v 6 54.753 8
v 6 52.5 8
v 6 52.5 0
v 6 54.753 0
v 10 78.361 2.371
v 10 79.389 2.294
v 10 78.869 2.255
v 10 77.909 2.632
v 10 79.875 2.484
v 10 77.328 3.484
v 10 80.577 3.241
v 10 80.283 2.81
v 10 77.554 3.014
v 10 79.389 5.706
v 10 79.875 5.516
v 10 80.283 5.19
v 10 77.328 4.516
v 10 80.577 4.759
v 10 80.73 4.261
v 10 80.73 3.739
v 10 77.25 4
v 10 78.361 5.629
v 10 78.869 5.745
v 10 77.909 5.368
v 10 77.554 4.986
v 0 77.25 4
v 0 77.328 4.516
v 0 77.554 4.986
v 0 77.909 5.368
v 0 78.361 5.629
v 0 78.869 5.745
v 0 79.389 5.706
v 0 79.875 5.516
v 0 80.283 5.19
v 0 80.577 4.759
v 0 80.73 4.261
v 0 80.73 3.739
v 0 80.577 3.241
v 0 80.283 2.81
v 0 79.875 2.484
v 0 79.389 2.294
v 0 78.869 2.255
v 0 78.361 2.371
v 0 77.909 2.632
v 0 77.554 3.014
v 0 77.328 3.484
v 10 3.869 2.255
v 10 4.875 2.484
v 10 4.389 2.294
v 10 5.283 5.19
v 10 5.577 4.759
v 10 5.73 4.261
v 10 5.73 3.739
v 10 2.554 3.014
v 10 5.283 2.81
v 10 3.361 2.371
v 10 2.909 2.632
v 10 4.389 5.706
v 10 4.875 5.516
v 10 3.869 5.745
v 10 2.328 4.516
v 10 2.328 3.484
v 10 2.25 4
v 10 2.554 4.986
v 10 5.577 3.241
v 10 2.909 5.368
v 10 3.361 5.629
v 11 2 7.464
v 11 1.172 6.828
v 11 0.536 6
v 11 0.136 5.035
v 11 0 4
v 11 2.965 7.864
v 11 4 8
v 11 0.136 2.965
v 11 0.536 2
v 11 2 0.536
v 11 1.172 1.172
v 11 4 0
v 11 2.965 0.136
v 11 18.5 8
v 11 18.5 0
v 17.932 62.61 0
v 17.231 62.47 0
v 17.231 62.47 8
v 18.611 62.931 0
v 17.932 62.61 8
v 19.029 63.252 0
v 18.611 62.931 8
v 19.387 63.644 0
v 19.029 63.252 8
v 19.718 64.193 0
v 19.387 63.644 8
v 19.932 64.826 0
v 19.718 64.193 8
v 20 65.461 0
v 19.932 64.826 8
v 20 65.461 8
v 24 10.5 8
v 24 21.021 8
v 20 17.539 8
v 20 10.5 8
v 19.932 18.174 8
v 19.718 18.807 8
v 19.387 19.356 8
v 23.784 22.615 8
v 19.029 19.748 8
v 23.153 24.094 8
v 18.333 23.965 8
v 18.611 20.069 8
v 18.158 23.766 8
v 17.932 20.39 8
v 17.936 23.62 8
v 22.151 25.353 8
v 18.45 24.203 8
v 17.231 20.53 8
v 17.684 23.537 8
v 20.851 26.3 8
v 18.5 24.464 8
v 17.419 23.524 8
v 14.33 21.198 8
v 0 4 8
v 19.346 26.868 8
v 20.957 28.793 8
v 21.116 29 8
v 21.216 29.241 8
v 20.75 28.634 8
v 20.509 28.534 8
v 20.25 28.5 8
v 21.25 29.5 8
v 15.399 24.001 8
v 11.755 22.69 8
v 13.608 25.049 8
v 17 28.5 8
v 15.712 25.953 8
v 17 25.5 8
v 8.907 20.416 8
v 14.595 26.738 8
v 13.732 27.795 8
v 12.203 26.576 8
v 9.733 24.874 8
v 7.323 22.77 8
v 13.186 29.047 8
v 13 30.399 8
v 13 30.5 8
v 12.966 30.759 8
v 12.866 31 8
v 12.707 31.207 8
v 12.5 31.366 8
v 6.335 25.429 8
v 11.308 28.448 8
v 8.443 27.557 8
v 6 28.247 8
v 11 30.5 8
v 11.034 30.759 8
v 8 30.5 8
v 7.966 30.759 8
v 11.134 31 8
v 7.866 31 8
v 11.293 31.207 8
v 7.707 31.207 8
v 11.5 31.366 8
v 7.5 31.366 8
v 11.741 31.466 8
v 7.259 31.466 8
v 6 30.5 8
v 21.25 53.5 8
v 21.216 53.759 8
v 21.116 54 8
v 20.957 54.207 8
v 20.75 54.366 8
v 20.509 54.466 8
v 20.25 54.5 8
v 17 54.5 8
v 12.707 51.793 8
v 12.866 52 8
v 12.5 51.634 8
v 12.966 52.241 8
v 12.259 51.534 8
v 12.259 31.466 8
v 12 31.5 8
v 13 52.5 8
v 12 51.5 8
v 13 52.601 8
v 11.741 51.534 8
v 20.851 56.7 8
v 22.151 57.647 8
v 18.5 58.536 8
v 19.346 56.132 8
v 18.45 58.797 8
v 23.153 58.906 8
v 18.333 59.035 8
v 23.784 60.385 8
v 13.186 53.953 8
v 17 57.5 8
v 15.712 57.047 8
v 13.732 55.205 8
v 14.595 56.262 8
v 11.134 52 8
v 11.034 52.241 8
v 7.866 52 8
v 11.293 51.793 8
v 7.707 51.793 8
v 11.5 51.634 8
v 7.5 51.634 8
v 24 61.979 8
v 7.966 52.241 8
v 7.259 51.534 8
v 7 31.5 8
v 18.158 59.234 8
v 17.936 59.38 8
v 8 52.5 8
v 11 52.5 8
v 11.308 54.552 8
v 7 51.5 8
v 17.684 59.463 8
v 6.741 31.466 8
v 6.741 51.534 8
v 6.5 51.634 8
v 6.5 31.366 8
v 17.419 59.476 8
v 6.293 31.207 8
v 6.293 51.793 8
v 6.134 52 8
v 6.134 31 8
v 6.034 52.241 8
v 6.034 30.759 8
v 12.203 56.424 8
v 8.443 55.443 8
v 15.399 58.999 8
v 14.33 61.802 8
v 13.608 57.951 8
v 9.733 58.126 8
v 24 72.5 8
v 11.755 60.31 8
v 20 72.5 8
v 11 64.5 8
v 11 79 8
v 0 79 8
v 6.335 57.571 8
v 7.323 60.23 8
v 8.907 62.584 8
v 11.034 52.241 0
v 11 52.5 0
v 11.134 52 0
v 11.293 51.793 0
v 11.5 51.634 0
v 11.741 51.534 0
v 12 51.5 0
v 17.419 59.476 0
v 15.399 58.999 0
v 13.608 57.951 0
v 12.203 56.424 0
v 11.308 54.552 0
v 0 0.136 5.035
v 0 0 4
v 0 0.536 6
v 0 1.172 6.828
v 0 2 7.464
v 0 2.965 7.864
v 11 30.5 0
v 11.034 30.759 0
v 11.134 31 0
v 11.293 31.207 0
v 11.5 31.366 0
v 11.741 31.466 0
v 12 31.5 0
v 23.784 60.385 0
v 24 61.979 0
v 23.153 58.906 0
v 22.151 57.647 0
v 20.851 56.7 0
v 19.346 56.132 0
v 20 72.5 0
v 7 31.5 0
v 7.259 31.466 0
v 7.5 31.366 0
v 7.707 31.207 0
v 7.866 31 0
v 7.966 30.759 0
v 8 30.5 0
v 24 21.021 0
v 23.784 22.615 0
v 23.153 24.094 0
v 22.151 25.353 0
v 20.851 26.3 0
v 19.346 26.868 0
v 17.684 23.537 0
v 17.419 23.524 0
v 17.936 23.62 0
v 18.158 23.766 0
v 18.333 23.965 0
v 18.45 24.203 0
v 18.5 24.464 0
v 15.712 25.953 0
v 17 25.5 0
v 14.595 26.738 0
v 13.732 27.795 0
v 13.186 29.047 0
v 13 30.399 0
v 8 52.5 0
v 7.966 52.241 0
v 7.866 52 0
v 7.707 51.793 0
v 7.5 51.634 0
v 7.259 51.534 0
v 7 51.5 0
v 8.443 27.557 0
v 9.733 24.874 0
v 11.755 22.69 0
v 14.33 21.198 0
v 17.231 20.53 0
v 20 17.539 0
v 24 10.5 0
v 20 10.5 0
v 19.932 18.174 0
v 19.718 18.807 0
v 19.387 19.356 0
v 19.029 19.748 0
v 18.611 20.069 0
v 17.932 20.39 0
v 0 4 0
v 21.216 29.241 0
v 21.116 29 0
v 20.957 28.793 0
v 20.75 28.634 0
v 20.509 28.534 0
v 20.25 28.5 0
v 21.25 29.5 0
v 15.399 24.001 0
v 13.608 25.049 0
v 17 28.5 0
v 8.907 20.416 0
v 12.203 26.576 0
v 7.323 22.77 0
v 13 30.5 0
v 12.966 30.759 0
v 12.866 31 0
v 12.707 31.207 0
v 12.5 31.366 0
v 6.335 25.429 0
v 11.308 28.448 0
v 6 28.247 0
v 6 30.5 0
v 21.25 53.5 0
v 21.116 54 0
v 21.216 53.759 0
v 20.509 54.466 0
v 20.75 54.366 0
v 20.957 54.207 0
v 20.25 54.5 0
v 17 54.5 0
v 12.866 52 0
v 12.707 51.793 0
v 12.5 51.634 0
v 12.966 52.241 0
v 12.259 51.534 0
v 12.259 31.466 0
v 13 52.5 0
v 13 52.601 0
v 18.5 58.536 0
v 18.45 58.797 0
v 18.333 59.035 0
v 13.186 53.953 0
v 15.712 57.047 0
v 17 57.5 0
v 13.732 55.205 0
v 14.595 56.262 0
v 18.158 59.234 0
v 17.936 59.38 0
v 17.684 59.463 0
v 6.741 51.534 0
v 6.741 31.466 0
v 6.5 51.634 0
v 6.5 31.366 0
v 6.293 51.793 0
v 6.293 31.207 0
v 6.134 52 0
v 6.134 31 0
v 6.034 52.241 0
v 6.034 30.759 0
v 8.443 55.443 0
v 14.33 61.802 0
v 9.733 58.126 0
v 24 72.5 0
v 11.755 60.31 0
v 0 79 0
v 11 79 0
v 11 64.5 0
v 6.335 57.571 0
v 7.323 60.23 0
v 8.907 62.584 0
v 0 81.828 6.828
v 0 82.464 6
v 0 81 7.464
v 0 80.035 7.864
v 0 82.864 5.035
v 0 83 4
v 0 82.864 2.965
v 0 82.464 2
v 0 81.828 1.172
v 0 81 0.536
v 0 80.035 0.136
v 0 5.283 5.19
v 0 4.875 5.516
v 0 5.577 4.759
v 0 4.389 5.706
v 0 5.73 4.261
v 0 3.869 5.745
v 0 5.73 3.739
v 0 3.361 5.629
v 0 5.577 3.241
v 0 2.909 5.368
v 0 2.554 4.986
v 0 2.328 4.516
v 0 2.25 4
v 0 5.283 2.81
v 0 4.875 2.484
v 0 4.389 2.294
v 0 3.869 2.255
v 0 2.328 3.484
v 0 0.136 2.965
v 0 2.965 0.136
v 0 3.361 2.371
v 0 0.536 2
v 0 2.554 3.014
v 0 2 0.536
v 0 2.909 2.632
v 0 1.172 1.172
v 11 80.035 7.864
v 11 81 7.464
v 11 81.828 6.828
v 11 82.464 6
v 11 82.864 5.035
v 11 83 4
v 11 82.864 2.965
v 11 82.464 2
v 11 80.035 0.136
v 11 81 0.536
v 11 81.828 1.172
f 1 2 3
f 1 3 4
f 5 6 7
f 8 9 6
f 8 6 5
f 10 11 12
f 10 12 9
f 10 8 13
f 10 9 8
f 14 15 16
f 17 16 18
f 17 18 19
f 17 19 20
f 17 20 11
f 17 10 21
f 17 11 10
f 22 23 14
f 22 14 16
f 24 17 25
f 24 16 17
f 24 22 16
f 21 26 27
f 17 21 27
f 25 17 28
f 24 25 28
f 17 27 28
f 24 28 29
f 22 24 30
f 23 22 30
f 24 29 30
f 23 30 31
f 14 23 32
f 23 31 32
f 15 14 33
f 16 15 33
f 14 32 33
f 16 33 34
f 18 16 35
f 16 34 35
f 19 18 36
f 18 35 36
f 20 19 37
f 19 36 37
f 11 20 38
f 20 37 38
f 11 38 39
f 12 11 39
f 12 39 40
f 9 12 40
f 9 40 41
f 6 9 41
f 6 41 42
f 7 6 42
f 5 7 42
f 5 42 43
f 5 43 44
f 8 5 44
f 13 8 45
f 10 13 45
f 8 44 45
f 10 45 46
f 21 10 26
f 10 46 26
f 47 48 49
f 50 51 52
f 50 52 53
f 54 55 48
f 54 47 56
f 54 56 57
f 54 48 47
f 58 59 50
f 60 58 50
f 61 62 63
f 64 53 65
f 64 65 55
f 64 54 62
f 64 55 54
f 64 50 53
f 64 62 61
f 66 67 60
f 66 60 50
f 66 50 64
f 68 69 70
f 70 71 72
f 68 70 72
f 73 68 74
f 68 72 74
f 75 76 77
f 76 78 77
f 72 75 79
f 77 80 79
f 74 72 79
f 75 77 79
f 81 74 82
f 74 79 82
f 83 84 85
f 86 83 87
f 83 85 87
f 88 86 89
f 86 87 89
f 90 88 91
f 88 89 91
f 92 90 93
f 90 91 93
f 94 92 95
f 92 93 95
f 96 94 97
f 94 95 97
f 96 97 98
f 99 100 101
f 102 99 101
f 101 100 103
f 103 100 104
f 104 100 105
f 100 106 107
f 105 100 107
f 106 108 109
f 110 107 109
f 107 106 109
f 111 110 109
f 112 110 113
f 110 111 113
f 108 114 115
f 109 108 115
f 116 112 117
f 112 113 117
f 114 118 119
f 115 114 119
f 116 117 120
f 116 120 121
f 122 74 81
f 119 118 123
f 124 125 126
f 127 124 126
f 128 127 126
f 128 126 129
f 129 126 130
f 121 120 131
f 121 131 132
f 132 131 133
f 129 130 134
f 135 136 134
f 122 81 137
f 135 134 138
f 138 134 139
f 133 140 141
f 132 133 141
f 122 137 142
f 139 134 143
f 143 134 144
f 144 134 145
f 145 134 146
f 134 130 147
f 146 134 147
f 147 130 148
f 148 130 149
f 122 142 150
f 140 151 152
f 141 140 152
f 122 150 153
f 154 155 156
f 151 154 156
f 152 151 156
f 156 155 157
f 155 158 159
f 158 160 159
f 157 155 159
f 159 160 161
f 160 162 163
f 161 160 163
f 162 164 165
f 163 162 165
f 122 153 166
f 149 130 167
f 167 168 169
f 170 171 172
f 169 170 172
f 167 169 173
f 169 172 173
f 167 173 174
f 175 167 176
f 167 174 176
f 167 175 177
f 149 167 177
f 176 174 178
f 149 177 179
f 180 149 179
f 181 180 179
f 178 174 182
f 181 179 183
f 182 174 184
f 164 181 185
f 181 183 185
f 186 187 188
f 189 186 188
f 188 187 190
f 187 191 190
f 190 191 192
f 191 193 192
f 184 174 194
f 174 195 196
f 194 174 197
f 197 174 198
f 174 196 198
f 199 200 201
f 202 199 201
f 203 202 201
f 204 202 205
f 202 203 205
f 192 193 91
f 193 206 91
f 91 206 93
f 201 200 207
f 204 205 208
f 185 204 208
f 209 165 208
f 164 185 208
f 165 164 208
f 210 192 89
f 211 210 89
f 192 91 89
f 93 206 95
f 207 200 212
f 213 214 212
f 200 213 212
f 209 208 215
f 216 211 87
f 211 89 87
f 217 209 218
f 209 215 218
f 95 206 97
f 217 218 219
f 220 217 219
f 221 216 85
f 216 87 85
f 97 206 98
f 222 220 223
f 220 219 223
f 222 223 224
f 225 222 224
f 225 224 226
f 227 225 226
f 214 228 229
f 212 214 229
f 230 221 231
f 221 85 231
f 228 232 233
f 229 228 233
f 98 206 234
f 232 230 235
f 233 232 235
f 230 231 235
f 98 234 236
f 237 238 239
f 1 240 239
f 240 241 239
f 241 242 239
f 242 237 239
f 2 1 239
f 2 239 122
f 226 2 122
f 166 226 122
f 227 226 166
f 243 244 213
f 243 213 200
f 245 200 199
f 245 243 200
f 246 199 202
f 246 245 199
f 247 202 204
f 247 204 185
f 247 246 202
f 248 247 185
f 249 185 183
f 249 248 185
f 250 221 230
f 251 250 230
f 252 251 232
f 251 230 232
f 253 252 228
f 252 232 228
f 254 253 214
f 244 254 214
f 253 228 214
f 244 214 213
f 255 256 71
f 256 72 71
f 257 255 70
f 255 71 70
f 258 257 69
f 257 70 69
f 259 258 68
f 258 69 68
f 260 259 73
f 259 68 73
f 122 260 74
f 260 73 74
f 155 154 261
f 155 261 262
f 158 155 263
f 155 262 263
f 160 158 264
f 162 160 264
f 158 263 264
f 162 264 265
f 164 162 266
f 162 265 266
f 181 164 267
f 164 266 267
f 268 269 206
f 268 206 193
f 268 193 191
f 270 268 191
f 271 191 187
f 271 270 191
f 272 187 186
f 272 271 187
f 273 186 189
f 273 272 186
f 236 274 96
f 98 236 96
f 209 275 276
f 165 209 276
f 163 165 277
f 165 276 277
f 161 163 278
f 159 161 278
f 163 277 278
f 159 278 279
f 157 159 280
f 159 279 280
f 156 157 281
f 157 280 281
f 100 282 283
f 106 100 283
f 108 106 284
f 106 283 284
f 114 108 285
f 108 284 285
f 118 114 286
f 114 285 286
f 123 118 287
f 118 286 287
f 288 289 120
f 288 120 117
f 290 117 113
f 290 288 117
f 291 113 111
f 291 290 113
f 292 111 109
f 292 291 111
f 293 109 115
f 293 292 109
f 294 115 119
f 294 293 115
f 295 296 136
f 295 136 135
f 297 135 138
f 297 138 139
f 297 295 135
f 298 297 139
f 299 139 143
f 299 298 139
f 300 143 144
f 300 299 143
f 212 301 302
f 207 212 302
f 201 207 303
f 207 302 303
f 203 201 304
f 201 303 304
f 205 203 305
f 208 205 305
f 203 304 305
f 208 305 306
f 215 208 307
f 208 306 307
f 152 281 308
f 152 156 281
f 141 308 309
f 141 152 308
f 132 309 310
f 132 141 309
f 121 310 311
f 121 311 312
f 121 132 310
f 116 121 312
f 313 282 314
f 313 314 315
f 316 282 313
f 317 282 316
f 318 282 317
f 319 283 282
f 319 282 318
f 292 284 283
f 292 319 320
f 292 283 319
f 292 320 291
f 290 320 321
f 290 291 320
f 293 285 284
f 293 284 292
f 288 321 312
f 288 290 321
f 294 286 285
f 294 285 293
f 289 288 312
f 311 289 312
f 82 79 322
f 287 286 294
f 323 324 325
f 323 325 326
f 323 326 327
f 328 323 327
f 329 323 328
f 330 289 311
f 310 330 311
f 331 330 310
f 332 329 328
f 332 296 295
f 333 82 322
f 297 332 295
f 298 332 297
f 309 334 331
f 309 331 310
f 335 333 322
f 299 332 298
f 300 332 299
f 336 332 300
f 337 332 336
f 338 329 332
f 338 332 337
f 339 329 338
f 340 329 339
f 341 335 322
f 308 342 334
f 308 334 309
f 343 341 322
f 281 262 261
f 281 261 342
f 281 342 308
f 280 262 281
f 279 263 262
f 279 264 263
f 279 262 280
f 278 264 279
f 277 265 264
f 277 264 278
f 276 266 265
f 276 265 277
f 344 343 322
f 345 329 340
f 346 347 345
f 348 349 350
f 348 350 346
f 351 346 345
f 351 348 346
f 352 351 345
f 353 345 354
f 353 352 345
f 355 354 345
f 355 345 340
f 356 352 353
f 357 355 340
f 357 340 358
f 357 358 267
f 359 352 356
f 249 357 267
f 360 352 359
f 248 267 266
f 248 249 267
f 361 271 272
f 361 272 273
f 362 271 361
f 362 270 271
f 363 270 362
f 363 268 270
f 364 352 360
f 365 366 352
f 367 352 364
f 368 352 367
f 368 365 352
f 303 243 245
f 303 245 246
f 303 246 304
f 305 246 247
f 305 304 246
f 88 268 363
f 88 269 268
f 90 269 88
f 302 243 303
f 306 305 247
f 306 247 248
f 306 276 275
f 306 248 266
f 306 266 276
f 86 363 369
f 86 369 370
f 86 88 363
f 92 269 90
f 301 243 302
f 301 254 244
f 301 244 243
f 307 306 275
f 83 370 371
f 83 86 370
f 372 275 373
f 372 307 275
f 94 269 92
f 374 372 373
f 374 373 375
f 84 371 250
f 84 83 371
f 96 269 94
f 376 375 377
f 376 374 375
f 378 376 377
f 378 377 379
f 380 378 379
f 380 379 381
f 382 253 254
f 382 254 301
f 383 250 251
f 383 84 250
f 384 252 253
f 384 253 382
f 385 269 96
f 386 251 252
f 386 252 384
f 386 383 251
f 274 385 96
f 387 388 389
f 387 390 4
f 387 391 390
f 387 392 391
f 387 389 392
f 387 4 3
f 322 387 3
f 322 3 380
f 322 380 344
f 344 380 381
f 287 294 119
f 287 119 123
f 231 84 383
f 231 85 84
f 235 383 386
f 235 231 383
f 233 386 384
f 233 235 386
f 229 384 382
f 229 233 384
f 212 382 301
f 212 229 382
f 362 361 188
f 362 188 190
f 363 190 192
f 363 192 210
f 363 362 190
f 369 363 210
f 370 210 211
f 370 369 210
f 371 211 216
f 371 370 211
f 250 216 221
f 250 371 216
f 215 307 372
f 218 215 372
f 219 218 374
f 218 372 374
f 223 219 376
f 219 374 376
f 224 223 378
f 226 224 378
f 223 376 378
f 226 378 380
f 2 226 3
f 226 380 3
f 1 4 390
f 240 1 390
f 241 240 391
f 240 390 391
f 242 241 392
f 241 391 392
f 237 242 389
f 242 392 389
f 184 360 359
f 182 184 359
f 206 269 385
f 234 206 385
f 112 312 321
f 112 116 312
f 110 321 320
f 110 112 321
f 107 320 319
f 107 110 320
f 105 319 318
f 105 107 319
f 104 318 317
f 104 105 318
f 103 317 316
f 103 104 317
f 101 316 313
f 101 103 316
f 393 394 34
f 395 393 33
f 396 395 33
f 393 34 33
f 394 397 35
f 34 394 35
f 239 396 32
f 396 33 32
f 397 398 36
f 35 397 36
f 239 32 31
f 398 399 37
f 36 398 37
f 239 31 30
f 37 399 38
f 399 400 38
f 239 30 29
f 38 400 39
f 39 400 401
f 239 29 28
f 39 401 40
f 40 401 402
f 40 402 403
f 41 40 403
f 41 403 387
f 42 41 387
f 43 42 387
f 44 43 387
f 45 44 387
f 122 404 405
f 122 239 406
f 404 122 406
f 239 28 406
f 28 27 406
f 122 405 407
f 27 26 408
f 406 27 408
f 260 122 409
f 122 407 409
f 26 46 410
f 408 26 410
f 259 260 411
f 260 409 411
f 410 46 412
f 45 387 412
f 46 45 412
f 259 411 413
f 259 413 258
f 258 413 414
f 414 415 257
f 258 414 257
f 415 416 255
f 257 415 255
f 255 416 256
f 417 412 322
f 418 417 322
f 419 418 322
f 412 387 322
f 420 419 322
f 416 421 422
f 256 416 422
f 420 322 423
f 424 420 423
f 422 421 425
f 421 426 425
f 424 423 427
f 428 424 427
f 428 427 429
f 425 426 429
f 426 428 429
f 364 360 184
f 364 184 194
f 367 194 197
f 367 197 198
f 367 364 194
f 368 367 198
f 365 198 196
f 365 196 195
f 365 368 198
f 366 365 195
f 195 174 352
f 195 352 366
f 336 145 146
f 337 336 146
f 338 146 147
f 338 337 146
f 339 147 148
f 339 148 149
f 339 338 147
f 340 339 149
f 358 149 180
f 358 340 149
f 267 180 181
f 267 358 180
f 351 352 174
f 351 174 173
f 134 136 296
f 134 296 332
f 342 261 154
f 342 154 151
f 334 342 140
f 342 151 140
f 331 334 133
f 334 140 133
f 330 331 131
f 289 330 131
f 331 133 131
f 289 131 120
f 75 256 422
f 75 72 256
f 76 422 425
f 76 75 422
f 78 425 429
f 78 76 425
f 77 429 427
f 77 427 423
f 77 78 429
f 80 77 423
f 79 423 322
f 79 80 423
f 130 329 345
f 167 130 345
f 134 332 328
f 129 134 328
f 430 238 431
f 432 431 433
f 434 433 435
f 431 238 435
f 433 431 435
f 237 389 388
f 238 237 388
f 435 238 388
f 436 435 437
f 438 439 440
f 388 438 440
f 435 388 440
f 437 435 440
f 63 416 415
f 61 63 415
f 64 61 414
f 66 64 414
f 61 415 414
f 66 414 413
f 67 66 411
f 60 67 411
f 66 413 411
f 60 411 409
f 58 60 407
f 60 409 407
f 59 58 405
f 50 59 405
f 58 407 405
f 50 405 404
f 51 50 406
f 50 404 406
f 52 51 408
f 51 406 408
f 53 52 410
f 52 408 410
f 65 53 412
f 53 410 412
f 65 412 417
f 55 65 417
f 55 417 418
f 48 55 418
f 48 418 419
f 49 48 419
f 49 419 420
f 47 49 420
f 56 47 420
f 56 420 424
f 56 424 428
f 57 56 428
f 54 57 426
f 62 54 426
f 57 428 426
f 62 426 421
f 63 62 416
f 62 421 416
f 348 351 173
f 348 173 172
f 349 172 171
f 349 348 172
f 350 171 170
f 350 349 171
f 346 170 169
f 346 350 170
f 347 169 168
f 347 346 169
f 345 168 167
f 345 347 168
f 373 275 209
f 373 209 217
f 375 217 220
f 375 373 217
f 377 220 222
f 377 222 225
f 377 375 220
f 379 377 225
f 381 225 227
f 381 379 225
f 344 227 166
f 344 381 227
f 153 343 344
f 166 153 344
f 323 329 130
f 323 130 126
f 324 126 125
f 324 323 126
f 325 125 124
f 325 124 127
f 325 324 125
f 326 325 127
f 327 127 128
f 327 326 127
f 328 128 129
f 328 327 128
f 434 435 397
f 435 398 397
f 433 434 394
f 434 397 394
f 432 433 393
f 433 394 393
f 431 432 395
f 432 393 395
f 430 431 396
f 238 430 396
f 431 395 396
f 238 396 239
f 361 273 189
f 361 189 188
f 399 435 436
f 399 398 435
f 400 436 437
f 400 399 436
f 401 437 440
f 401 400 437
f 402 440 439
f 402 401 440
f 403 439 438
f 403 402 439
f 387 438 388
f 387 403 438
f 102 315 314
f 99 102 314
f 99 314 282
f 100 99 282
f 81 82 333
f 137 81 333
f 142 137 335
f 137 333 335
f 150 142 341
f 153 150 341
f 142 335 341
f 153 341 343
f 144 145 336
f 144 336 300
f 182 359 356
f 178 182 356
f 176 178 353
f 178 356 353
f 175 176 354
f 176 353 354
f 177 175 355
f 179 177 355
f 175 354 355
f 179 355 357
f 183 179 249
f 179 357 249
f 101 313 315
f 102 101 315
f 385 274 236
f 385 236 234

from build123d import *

# Parameters (mm, degrees)
F0_W          = 4
F0_H          = 8
F0_H_2        = 2
F0_W_2        = 5.5
F0_H_3        = 3.5
F0_W_3        = 4.25
F0_H_4        = 26
F1_DEPTH      = 8
F2_R          = 3.99999
F3_T1_DEPTH   = 37.8956518578
F4_T1_DEPTH   = 21.1532650868
F5_T1_DEPTH   = 21.1532650868
F6_R          = 1.75
F7_DEPTH      = 10
F8_T1_DEPTH   = 32.4948974279
F9_R          = 7
F10_R         = 10
F11_T1_DEPTH  = 8
F12_R         = 3
F13_T1_DEPTH  = 8
F13_T3_DEPTH  = 8
F13_T5_DEPTH  = 8
F13_T7_DEPTH  = 8
F13_T9_DEPTH  = 8
F13_T11_DEPTH = 8
F13_T13_DEPTH = 8
F13_T15_DEPTH = 8
F13_T17_DEPTH = 8
F13_T19_DEPTH = 8
F13_T21_DEPTH = 13
F13_T23_DEPTH = 13


# Not quite as in the source:
# - a fillet or chamfer that OpenCascade refuses, or shapes differently, is made with other operations: its cross-section is extruded or revolved along the edge and cut away or added
# - two fillets or chamfers of one size are made in one step
# - a fillet or chamfer is up to 0.001 mm smaller than in the source, because OpenCascade refuses the exact size


with BuildPart() as f1:
    # F0 (on Top) → F1 (new body)
    with BuildSketch(Plane.XY):
        Polygon((0, 83), (0, 0), (11, 0), (11, 10), (11, 18.5), (6, 18.5), (6, 31.5), (8, 31.5), (11, 31.5), (13, 31.5), (13, 25.5), (17, 25.5), (17, 28.5), (17, 54.5), (17, 57.5), (13, 57.5), (13, 51.5), (11, 51.5), (8, 51.5), (6, 51.5), (6, 64.5), (11, 64.5), (11, 73), (11, 83), align=None)
        with Locations((22, 68.5)):
            Rectangle(F0_W, F0_H)
        with Locations((22, 63.5)):
            Rectangle(F0_W, F0_H_2)
        with Locations((21.25, 57.75)):
            Rectangle(F0_W_2, F0_H_3)
        with Locations((21.25, 25.25)):
            Rectangle(F0_W_2, F0_H_3)
        with Locations((22, 19.5)):
            Rectangle(F0_W, F0_H_2)
        with Locations((22, 14.5)):
            Rectangle(F0_W, F0_H)
        Polygon((11, 23.5), (11, 20.5), (20, 20.5), (24, 20.5), (24, 23.5), (18.5, 23.5), (17, 23.5), align=None)
        Polygon((8, 20.5), (11, 20.5), (11, 23.5), (11, 25.5), (11, 31.5), (8, 31.5), align=None)
        Polygon((11, 59.5), (11, 62.5), (8, 62.5), (8, 51.5), (11, 51.5), (11, 57.5), align=None)
        Polygon((20, 62.5), (11, 62.5), (11, 59.5), (17, 59.5), (18.5, 59.5), (24, 59.5), (24, 62.5), align=None)
        with Locations((19.125, 41.5)):
            Rectangle(F0_W_3, F0_H_4)
    extrude(amount=F1_DEPTH)

    # F2 (radius 4 in the source; OpenCascade refuses exactly that, so slightly less here)
    f2_edges = [f1.edges().sort_by_distance(p)[0] for p in [
        (5.5, 83, 8),
        (5.5, 0, 8),
        (5.5, 0, 0),
        (5.5, 83, 0),
    ]]
    fillet(f2_edges, radius=F2_R)

    # F3: fillet of radius 6 on 2 edges, made by hand

    # F3_s2 → F3_t1 (cut)
    with BuildSketch(Plane.XY.offset(-14.9478259289)):
        with BuildLine():
            ThreePointArc((24, 61.9791303716), (22.4158804332, 57.9171111692), (18.5, 56))
            Line((18.5, 56), (24, 56))
            Line((24, 56), (24, 61.9791303716))
        make_face()
        with BuildLine():
            ThreePointArc((24, 21.0208696284), (22.4158804332, 25.0828888308), (18.5, 27))
            Line((18.5, 27), (24, 27))
            Line((24, 27), (24, 21.0208696284))
        make_face()
    extrude(amount=F3_T1_DEPTH, mode=Mode.SUBTRACT)

    # F4: chamfer of 0.5 x 2.5 on 1 edges, made by hand

    # F4_s2 → F4_t1 (cut)
    with BuildSketch(Plane.XY.offset(-6.5766325434)):
        with BuildLine():
            Line((19.379363756, 56.0377654524), (18.466798813, 58.6304434947))
            Line((18.466798813, 58.6304434947), (18.416798813, 58.6304434947))
            ThreePointArc((18.416798813, 58.6304434947), (18.45, 57.3152217474), (18.45, 56))
            Line((18.45, 56), (18.5041666667, 55.9501739136))
            ThreePointArc((18.5041666667, 55.9501739136), (18.9421943049, 56.0029468158), (19.3905817774, 55.9890401407))
            Line((19.3905817774, 55.9890401407), (19.379363756, 56.0377654524))
        make_face()
    extrude(amount=F4_T1_DEPTH, mode=Mode.SUBTRACT)

    # F5: chamfer of 0.5 x 2.5 on 1 edges, made by hand

    # F5_s2 → F5_t1 (cut)
    with BuildSketch(Plane.XY.offset(-6.5766325434)):
        with BuildLine():
            Line((18.466798813, 24.3695565053), (19.379363756, 26.9622345476))
            Line((19.379363756, 26.9622345476), (19.3905817774, 27.0109598593))
            ThreePointArc((19.3905817774, 27.0109598593), (18.9421943049, 26.9970531842), (18.5041666667, 27.0498260864))
            Line((18.5041666667, 27.0498260864), (18.45, 27))
            ThreePointArc((18.45, 27), (18.45, 25.6847782526), (18.416798813, 24.3695565053))
            Line((18.416798813, 24.3695565053), (18.466798813, 24.3695565053))
        make_face()
    extrude(amount=F5_T1_DEPTH, mode=Mode.SUBTRACT)

    # F6 (on face) → F7 (cut)
    with BuildSketch(Plane(origin=(0, 0, 0), x_dir=(0, -1, 0), z_dir=(-1, 0, 0))):
        with Locations((-79, 4)):
            Circle(F6_R)
        with Locations((-4, 4)):
            Circle(F6_R)
    extrude(amount=-F7_DEPTH, mode=Mode.SUBTRACT)

    # F8: fillet of radius 5 on 2 edges, made by hand

    # F8_s2 → F8_t1 (cut)
    with BuildSketch(Plane.XY.offset(-12.2474487139)):
        with BuildLine():
            ThreePointArc((13, 52.6010205144), (14.1270166538, 55.7632981746), (17, 57.5))
            Line((17, 57.5), (13, 57.5))
            Line((13, 57.5), (13, 52.6010205144))
        make_face()
        with BuildLine():
            ThreePointArc((17, 25.5), (14.1270166538, 27.2367018254), (13, 30.3989794856))
            Line((13, 30.3989794856), (13, 25.5))
            Line((13, 25.5), (17, 25.5))
        make_face()
    extrude(amount=F8_T1_DEPTH, mode=Mode.SUBTRACT)

    # F9
    f9_edges = [f1.edges().sort_by_distance(p)[0] for p in [
        (11, 59.5, 4),
        (11, 23.5, 4),
    ]]
    fillet(f9_edges, radius=F9_R)

    # F10
    f10_edges = [f1.edges().sort_by_distance(p)[0] for p in [
        (8, 62.5, 4),
        (8, 20.5, 4),
    ]]
    fillet(f10_edges, radius=F10_R)

    # F11: fillet of radius 12 on 2 edges, made by hand

    # F11_s2 → F11_t1 (join)
    with BuildSketch(Plane.XY):
        with BuildLine():
            ThreePointArc((6, 54.7532056552), (7.322921748, 60.2304312302), (11, 64.5))
            Line((11, 64.5), (6, 64.5))
            Line((6, 64.5), (6, 54.7532056552))
        make_face()
        with BuildLine():
            ThreePointArc((11, 18.5), (7.322921748, 22.7695687698), (6, 28.2467943448))
            Line((6, 28.2467943448), (6, 18.5))
            Line((6, 18.5), (11, 18.5))
        make_face()
    extrude(amount=F11_T1_DEPTH)

    # F12
    f12_edges = [f1.edges().sort_by_distance(p)[0] for p in [
        (20, 62.5, 4),
        (20, 20.5, 4),
    ]]
    fillet(f12_edges, radius=F12_R)

    # F13: fillet of radius 1 on 12 edges, made by hand

    # F13_s2 → F13_t1 (join)
    with BuildSketch(Plane.XY):
        with BuildLine():
            ThreePointArc((8, 52.5), (7.7071067812, 51.7928932188), (7, 51.5))
            Line((7, 51.5), (8, 51.5))
            Line((8, 51.5), (8, 52.5))
        make_face()
    extrude(amount=F13_T1_DEPTH)

    # F13_s4 → F13_t3 (join)
    with BuildSketch(Plane.XY):
        with BuildLine():
            ThreePointArc((7, 51.5), (6.2928932188, 51.7928932188), (6, 52.5))
            Line((6, 52.5), (6, 51.5))
            Line((6, 51.5), (7, 51.5))
        make_face()
    extrude(amount=F13_T3_DEPTH)

    # F13_s6 → F13_t5 (join)
    with BuildSketch(Plane.XY):
        with BuildLine():
            ThreePointArc((18.5, 58.536115974), (18.1575199019, 59.2341109303), (17.4185535189, 59.4758096297))
            Line((17.4185535189, 59.4758096297), (17.4102471406, 59.575464053))
            ThreePointArc((17.4102471406, 59.575464053), (18, 59.6), (18.5, 59.6))
            Line((18.5, 59.6), (18.6, 59.5))
            ThreePointArc((18.6, 59.5), (18.6, 59.018057987), (18.5998382698, 58.5418010318))
            Line((18.5998382698, 58.5418010318), (18.5, 58.536115974))
        make_face()
    extrude(amount=F13_T5_DEPTH)

    # F13_s8 → F13_t7 (join)
    with BuildSketch(Plane.XY):
        with BuildLine():
            ThreePointArc((11, 52.5), (11.2928932188, 51.7928932188), (12, 51.5))
            Line((12, 51.5), (11, 51.5))
            Line((11, 51.5), (11, 52.5))
        make_face()
    extrude(amount=F13_T7_DEPTH)

    # F13_s10 → F13_t9 (join)
    with BuildSketch(Plane.XY):
        with BuildLine():
            ThreePointArc((13, 52.5), (12.7071067812, 51.7928932188), (12, 51.5))
            Line((12, 51.5), (13, 51.5))
            Line((13, 51.5), (13, 52.5))
        make_face()
    extrude(amount=F13_T9_DEPTH)

    # F13_s12 → F13_t11 (join)
    with BuildSketch(Plane.XY):
        with BuildLine():
            ThreePointArc((7, 31.5), (6.2928932188, 31.2071067812), (6, 30.5))
            Line((6, 30.5), (6, 31.5))
            Line((6, 31.5), (7, 31.5))
        make_face()
    extrude(amount=F13_T11_DEPTH)

    # F13_s14 → F13_t13 (join)
    with BuildSketch(Plane.XY):
        with BuildLine():
            ThreePointArc((7, 31.5), (7.7071067812, 31.2071067812), (8, 30.5))
            Line((8, 30.5), (8, 31.5))
            Line((8, 31.5), (7, 31.5))
        make_face()
    extrude(amount=F13_T13_DEPTH)

    # F13_s16 → F13_t15 (join)
    with BuildSketch(Plane.XY):
        with BuildLine():
            ThreePointArc((13, 30.5), (12.7071067812, 31.2071067812), (12, 31.5))
            Line((12, 31.5), (13, 31.5))
            Line((13, 31.5), (13, 30.5))
        make_face()
    extrude(amount=F13_T15_DEPTH)

    # F13_s18 → F13_t17 (join)
    with BuildSketch(Plane.XY):
        with BuildLine():
            ThreePointArc((11, 30.5), (11.2928932188, 31.2071067812), (12, 31.5))
            Line((12, 31.5), (11, 31.5))
            Line((11, 31.5), (11, 30.5))
        make_face()
    extrude(amount=F13_T17_DEPTH)

    # F13_s20 → F13_t19 (join)
    with BuildSketch(Plane.XY):
        with BuildLine():
            ThreePointArc((17.4185535189, 23.5241903703), (18.1575199019, 23.7658890697), (18.5, 24.463884026))
            Line((18.5, 24.463884026), (18.5998382698, 24.4581989682))
            ThreePointArc((18.5998382698, 24.4581989682), (18.6, 23.981942013), (18.6, 23.5))
            Line((18.6, 23.5), (18.5, 23.4))
            ThreePointArc((18.5, 23.4), (18, 23.4), (17.4102471406, 23.424535947))
            Line((17.4102471406, 23.424535947), (17.4185535189, 23.5241903703))
        make_face()
    extrude(amount=F13_T19_DEPTH)

    # F13_s22 → F13_t21 (cut)
    with BuildSketch(Plane.XY.offset(-2.5)):
        with BuildLine():
            ThreePointArc((20.25, 54.5), (20.9571067812, 54.2071067812), (21.25, 53.5))
            Line((21.25, 53.5), (21.25, 54.5))
            Line((21.25, 54.5), (20.25, 54.5))
        make_face()
    extrude(amount=F13_T21_DEPTH, mode=Mode.SUBTRACT)

    # F13_s24 → F13_t23 (cut)
    with BuildSketch(Plane.XY.offset(-2.5)):
        with BuildLine():
            ThreePointArc((21.25, 29.5), (20.9571067812, 28.7928932188), (20.25, 28.5))
            Line((20.25, 28.5), (21.25, 28.5))
            Line((21.25, 28.5), (21.25, 29.5))
        make_face()
    extrude(amount=F13_T23_DEPTH, mode=Mode.SUBTRACT)


solid = f1.part
